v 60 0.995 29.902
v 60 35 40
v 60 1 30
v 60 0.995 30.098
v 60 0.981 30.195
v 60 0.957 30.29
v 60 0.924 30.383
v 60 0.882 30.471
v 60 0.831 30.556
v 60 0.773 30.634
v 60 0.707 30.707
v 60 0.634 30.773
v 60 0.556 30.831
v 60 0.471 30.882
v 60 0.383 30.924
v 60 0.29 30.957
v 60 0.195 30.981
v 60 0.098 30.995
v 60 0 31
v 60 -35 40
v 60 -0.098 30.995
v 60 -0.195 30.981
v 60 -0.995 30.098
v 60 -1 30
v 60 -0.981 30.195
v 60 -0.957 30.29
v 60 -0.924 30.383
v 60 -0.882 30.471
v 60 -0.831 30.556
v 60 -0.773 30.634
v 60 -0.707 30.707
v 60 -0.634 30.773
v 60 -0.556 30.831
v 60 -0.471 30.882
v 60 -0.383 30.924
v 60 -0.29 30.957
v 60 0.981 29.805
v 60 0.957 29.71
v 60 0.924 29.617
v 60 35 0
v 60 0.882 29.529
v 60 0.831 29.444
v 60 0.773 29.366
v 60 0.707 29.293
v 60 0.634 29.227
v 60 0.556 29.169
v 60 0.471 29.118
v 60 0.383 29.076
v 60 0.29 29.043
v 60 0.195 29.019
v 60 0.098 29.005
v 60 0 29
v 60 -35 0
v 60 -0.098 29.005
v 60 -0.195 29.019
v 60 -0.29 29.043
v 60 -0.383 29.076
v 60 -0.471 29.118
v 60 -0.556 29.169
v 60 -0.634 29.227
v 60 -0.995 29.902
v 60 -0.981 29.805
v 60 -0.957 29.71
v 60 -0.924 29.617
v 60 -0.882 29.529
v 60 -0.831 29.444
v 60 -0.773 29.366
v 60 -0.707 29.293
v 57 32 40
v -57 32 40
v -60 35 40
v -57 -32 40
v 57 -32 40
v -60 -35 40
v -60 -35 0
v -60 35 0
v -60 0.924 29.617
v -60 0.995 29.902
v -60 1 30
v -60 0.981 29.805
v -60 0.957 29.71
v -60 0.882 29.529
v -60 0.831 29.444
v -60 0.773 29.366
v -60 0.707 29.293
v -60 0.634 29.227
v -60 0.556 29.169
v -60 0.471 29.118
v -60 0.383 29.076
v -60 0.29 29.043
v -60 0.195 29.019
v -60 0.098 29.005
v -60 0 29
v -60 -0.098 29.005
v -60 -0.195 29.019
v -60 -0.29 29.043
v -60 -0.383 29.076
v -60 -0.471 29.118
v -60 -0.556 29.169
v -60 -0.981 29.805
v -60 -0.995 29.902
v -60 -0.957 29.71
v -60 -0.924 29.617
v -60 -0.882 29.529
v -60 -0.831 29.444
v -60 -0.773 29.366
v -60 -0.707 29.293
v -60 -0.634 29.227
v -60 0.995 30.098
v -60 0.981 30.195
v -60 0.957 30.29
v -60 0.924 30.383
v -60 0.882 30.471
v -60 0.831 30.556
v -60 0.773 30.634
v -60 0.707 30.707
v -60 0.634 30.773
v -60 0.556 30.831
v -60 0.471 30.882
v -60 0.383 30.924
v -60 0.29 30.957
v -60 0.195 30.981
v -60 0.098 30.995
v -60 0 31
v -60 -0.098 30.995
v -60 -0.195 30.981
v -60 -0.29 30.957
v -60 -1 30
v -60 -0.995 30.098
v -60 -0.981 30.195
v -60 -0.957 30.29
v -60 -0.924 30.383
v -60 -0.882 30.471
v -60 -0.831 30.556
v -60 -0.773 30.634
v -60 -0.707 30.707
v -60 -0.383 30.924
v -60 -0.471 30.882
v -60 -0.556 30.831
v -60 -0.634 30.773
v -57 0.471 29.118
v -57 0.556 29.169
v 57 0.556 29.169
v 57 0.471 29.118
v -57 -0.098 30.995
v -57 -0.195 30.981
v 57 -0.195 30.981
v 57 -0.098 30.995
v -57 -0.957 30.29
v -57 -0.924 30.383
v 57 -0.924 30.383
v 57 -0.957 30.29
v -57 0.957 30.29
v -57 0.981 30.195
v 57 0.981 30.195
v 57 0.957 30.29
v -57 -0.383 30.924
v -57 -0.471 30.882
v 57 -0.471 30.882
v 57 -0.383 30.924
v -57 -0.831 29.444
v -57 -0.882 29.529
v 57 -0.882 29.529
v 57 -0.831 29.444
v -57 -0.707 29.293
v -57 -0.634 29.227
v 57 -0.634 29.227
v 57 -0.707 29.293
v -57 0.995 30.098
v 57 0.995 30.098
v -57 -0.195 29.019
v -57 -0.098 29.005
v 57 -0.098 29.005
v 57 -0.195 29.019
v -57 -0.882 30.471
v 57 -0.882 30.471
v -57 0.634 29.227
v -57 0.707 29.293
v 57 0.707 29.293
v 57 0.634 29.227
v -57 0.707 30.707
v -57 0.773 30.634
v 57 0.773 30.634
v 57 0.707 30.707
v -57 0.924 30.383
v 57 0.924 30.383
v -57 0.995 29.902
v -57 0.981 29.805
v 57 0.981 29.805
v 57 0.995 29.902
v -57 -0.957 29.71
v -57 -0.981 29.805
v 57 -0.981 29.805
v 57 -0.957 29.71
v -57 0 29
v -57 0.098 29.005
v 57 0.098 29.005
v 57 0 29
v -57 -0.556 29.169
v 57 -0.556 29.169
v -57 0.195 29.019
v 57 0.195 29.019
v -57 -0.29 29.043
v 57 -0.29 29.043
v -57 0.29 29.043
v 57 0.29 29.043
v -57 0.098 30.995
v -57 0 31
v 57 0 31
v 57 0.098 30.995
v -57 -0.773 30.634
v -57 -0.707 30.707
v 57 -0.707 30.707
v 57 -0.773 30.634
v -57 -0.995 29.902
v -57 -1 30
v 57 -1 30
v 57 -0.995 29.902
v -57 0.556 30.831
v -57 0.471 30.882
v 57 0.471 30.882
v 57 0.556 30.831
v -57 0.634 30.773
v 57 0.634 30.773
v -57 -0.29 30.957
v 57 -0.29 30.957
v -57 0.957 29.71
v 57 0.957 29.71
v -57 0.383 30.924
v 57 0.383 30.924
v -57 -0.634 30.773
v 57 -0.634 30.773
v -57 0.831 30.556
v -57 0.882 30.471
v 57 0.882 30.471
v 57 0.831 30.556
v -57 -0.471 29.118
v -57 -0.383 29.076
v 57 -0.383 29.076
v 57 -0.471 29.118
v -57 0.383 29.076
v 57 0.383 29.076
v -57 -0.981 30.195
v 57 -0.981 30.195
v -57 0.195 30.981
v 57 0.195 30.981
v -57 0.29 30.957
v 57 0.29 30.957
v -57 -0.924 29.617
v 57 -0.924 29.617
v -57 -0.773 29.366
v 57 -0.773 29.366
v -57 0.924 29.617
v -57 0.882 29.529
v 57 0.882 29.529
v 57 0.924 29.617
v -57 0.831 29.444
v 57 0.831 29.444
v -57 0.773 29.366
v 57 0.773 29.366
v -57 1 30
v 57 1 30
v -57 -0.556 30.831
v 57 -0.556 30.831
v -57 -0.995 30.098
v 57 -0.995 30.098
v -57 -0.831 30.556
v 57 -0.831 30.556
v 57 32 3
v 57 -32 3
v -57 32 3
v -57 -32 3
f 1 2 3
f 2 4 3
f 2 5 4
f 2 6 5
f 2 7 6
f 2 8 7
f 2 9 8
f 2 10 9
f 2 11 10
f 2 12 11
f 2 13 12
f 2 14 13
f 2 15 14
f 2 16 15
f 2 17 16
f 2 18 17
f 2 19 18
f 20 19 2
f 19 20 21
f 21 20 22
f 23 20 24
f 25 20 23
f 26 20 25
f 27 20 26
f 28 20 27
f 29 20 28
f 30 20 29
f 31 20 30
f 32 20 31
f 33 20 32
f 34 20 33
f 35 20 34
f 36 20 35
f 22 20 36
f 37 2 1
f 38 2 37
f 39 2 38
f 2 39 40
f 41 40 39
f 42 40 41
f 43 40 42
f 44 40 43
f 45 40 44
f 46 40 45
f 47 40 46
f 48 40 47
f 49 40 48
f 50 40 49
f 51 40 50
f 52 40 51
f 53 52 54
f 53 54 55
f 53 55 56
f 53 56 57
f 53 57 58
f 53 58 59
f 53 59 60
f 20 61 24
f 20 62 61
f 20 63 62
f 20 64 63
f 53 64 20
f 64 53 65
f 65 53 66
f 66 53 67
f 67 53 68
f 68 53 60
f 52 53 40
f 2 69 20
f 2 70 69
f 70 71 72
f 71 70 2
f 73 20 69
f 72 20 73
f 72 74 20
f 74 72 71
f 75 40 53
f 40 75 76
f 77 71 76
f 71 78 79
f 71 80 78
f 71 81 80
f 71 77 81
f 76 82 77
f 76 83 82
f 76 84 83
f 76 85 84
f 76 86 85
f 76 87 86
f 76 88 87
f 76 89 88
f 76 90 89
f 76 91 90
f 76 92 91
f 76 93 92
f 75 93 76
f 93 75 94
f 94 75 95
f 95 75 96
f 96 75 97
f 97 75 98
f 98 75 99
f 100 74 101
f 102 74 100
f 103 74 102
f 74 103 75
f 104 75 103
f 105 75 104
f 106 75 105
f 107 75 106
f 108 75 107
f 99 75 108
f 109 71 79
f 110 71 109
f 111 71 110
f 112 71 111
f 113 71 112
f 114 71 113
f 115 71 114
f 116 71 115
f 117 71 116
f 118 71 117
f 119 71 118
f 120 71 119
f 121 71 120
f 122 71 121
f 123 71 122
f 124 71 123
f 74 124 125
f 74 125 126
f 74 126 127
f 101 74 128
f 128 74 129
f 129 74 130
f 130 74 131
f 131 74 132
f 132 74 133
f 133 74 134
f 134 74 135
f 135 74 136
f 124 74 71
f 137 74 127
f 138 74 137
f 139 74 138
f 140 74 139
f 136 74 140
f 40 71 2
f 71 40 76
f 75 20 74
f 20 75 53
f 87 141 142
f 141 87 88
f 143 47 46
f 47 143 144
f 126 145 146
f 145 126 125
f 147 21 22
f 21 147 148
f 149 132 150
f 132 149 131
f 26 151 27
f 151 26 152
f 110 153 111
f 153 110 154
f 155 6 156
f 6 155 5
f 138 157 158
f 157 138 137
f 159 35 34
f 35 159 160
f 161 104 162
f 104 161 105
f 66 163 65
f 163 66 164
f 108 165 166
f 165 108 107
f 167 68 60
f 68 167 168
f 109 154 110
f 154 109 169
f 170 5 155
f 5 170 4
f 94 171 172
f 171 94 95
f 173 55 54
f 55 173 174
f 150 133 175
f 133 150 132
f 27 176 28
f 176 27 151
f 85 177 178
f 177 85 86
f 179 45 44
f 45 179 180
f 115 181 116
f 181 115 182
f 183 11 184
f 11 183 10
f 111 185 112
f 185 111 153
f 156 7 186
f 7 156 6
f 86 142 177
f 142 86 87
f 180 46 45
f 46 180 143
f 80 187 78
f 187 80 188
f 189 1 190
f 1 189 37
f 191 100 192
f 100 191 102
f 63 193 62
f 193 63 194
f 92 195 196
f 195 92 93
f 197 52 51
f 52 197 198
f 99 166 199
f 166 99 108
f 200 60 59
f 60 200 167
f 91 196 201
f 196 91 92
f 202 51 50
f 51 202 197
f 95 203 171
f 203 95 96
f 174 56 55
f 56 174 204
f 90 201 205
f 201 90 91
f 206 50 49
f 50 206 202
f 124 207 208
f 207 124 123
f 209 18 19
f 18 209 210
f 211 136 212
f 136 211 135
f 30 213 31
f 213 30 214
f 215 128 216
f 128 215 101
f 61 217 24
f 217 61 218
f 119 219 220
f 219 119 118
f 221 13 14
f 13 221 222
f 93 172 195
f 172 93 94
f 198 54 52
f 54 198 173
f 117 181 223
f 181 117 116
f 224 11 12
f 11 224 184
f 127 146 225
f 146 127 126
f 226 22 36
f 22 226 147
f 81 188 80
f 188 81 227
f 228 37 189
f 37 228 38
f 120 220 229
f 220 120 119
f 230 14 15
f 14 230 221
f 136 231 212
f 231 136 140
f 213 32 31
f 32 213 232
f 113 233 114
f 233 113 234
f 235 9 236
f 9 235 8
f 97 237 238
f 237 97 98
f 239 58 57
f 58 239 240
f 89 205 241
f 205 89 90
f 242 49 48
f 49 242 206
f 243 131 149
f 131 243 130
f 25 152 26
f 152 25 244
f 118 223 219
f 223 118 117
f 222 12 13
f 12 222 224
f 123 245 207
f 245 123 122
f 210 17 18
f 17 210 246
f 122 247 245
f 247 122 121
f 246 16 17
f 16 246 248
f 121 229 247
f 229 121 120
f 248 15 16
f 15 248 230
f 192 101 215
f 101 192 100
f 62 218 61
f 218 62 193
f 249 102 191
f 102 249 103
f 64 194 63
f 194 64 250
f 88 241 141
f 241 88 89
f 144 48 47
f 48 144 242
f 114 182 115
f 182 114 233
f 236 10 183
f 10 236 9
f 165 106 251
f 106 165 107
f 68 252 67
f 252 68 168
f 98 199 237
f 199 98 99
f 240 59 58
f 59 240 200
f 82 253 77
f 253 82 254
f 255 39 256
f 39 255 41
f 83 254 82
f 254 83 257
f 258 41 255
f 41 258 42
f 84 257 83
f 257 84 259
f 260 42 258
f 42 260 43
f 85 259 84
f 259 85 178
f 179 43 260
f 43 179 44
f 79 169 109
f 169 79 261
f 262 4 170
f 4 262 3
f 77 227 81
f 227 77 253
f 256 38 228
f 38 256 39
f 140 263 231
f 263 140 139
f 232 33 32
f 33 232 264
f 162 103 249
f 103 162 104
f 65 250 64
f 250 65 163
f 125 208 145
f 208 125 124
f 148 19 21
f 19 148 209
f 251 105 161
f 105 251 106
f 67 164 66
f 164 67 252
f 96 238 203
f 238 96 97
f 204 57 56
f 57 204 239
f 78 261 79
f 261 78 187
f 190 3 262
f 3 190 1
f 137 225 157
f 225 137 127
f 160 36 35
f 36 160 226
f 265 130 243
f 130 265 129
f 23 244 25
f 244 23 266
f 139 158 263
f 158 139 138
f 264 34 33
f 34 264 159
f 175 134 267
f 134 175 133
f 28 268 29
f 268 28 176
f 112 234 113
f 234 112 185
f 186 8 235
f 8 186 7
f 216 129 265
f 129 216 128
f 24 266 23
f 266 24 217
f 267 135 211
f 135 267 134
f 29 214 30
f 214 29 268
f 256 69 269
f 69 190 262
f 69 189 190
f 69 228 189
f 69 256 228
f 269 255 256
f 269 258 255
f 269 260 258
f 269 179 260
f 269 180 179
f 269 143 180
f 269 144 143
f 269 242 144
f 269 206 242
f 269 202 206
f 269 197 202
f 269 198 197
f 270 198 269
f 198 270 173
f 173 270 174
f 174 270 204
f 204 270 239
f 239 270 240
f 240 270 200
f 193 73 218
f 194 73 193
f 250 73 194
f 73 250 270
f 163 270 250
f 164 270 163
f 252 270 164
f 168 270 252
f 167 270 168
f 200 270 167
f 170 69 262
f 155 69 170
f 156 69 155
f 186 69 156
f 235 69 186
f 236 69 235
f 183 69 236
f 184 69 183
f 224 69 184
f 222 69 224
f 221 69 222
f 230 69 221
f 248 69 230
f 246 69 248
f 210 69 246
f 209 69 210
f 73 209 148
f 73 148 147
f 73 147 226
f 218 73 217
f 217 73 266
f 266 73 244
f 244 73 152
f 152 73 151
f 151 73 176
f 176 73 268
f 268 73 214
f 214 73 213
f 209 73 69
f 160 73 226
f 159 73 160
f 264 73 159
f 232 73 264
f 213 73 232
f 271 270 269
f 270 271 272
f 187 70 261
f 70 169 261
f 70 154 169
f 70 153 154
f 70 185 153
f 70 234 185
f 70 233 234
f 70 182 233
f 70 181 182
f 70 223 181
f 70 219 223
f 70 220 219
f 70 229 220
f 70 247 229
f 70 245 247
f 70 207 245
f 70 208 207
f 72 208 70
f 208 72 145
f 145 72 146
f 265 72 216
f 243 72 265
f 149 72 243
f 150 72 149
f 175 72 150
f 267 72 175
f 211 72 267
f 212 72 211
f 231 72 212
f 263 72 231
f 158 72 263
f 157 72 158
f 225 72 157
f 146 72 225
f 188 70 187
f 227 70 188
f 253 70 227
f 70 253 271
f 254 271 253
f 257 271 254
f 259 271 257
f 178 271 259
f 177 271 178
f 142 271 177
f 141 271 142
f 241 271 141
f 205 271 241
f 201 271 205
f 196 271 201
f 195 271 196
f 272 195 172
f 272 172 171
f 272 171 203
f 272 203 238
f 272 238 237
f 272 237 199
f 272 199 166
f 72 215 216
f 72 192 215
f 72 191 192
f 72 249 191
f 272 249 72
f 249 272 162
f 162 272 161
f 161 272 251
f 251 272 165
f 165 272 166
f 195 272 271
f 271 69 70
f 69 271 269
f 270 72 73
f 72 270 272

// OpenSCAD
// --- Dimensions (mm) ---
outer_x = 120;          // Total length of the tank
outer_y = 70;           // Total width of the tank
outer_z = 40;           // Total height of the tank

wall_thickness = 3;     // Thickness of the walls and floor
floor_thickness = 3;    // Thickness of the floor

platform_length = 60;   // Length of the central platform (X direction)
platform_height = 13;   // Height of the platform top from the inner floor
platform_width = outer_y - (2 * wall_thickness); // Spans full inner width

hole_diameter = 2;      // Diameter of electrode wire holes
hole_y_pos = 0;         // Y position of holes (centered on Y axis)
hole_z_pos = 30;        // Z position of holes (measured from the bottom of the tank)

// --- Resolution ---
$fn = 64;

// --- Model Construction ---

// The user requested the part rests on the XY plane at z = 0.
// We build the geometry such that the bottom face is at Z=0.

module tank_geometry() {
    difference() {
        // 1. The Solid Body (Outer shell + Internal Platform)
        union() {
            // The main outer block (Base at Z=0)
            cube([outer_x, outer_y, outer_z]);

            // The Platform
            // The platform top is 13mm above the inner floor.
            // Inner floor is at Z = floor_thickness.
            // Platform top is at Z = floor_thickness + platform_height.
            // The platform block itself has height 'platform_height'.
            // To make the top of the platform reach the target height, 
            // we place the bottom of the platform at Z = floor_thickness.
            translate([
                (outer_x - platform_length) / 2, 
                (outer_y - platform_width) / 2, 
                floor_thickness
            ])
            cube([platform_length, platform_width, platform_height]);
        }

        // 2. The Inner Cavity (The space where buffer goes)
        // Subtract the void to create the tank.
        // We subtract from floor_thickness up to outer_z.
        translate([wall_thickness, wall_thickness, floor_thickness])
            cube([outer_x - 2*wall_thickness, outer_y - 2*wall_thickness, outer_z]);

        // 3. The Electrode Holes
        // Holes are at Z = 30 from the bottom of the tank.
        // The bottom of the tank is at Z = 0.
        // Therefore, the hole center is at Z = hole_z_pos.
        // The holes are drilled through the X-end walls.
        // We use a loop to drill through both ends.
        for (x_pos = [0, outer_x]) {
            translate([x_pos, outer_y/2, hole_z_pos])
                rotate([0, 90, 0])
                    cylinder(d = hole_diameter, h = outer_x + 2, center = true);
        }
    }
}

// Final Assembly:
// The geometry is already built starting from Z=0.
// We center it on X and Y.
translate([-outer_x/2, -outer_y/2, 0])
    tank_geometry();

// --- Verification of logic ---
// 1. Dimensions: 120x70x40. Correct.
// 2. Walls/Floor: 3mm. Correct.
// 3. Platform: 60mm long, spans full inner width, top is 13mm above inner floor. Correct.
// 4. Holes: 2mm diameter, at Y=0 (relative to center), Z=30 (from bottom). Correct.
// 5. Orientation: Rests on XY plane at Z=0. Correct.
